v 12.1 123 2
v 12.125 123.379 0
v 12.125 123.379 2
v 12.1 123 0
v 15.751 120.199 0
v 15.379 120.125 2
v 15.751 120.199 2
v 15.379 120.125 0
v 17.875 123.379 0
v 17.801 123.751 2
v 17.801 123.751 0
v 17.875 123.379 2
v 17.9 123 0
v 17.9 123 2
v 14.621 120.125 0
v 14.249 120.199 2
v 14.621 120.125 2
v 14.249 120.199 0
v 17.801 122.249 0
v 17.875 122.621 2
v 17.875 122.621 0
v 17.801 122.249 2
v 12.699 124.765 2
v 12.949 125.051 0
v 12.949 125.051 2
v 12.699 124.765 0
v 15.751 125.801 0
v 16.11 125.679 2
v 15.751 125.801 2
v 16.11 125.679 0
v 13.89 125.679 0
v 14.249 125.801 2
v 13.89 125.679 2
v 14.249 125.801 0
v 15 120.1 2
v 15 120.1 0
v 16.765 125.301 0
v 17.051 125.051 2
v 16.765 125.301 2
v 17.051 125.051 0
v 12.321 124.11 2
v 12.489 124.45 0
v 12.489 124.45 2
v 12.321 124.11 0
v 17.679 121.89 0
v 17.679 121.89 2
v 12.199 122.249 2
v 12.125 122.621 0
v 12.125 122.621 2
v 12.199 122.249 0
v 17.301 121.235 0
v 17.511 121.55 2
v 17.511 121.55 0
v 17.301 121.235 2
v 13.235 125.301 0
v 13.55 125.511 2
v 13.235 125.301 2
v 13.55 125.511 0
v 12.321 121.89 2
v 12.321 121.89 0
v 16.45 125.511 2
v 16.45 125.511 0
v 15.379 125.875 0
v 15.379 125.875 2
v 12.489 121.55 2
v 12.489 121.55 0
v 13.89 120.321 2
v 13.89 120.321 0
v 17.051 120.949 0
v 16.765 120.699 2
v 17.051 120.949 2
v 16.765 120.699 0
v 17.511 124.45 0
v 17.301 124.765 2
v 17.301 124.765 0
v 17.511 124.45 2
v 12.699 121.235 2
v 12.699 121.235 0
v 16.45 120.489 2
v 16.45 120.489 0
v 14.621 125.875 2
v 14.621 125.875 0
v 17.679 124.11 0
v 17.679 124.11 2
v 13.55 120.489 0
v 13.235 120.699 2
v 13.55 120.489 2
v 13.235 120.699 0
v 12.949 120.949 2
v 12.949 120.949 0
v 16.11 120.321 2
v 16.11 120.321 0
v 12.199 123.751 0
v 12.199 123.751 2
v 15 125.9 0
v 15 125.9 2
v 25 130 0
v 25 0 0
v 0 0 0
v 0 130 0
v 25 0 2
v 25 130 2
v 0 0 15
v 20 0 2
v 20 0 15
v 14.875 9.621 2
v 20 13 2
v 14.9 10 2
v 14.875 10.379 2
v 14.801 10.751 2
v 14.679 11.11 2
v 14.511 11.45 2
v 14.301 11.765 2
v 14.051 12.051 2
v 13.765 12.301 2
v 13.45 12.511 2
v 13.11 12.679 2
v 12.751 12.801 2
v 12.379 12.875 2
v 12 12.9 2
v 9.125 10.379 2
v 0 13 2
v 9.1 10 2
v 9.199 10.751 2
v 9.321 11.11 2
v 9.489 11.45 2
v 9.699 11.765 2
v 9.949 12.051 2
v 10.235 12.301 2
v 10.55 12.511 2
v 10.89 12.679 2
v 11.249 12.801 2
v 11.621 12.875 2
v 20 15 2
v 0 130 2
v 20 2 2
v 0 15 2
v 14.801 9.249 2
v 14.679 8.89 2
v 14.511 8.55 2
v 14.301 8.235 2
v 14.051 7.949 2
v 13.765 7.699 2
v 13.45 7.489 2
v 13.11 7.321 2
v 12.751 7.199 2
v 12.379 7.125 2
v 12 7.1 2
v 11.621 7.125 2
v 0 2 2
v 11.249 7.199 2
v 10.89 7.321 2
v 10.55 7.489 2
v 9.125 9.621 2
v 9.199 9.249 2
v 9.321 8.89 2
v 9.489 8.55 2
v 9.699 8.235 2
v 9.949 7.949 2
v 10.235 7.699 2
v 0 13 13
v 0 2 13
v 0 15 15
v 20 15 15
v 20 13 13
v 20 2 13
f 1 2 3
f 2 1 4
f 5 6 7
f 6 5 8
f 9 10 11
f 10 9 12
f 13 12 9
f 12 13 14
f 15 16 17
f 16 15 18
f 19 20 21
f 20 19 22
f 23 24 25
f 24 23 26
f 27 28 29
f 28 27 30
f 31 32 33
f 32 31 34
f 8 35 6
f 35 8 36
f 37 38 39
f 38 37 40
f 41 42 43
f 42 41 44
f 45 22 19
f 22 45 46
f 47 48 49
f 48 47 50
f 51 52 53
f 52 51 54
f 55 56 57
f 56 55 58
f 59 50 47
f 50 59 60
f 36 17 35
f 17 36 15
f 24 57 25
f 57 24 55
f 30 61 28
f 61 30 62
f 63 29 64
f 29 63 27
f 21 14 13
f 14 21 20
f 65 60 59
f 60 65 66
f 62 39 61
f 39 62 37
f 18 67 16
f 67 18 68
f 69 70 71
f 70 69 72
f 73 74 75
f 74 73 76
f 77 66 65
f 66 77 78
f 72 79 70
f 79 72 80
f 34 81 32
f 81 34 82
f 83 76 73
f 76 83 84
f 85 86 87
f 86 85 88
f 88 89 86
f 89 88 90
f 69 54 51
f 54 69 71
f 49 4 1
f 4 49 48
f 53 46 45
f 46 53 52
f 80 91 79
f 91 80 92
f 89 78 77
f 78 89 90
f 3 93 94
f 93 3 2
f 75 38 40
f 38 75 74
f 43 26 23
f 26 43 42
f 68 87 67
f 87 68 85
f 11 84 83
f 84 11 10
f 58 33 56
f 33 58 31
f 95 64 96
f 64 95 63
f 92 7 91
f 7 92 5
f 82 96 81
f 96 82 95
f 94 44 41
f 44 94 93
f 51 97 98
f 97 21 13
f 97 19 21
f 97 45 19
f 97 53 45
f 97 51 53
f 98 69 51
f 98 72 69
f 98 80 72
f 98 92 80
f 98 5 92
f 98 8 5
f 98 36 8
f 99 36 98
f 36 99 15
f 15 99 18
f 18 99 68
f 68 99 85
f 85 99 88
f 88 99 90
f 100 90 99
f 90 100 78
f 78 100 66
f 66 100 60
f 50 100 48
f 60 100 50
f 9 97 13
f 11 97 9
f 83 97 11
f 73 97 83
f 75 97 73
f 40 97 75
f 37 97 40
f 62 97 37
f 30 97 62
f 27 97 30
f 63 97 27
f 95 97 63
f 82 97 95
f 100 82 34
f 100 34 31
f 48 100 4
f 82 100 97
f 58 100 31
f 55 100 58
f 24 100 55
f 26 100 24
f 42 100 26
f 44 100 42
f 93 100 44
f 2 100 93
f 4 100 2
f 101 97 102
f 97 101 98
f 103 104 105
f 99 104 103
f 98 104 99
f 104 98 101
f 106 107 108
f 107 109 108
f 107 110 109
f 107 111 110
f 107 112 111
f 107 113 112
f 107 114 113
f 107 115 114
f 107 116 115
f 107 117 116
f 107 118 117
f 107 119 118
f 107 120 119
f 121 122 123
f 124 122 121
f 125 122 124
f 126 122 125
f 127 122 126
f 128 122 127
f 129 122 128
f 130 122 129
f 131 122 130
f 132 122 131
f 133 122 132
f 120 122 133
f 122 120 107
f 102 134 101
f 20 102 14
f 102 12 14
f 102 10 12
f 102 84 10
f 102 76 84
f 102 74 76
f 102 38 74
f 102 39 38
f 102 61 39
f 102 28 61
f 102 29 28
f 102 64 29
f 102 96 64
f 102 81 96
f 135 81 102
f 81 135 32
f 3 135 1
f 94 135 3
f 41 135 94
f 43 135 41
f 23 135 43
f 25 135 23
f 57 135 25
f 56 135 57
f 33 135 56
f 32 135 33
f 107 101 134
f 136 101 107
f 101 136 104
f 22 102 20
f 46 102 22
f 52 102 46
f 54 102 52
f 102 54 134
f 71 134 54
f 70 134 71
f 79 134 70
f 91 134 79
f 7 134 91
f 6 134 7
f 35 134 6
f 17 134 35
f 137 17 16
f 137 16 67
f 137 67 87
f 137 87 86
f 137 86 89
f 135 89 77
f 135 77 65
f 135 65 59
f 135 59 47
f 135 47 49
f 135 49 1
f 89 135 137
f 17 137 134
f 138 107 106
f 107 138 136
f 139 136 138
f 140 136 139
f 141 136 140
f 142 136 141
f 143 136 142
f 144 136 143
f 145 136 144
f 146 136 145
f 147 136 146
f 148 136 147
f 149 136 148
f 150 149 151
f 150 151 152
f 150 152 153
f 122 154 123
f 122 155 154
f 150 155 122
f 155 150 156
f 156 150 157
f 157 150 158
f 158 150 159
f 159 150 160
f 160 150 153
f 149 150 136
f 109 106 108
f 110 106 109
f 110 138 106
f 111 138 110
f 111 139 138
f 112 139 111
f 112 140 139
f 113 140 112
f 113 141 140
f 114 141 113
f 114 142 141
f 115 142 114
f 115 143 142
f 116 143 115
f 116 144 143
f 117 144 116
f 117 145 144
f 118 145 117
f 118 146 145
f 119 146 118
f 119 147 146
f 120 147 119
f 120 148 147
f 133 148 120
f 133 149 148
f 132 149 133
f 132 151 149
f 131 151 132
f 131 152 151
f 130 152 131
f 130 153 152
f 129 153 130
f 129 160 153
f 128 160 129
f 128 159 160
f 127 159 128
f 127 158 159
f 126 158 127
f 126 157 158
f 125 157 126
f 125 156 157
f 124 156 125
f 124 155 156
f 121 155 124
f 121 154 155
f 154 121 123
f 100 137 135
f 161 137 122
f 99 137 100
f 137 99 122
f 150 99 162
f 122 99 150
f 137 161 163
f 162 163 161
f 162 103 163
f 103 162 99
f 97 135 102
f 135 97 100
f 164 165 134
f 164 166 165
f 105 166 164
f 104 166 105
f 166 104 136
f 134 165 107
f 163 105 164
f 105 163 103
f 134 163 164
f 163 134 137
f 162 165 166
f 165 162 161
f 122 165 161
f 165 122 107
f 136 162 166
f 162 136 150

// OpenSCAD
$fn = 48;

union() {
	difference() {
		linear_extrude(height = 2) {
			polygon(paths = [[0, 1, 2, 3]], points = [[0, 0], [0, 130], [25, 130], [25, 0]]);
		}
		union() {
			translate(v = [12, 10, -1]) {
				cylinder(h = 4, r = 2.9000000000);
			}
			translate(v = [15, 123, -1]) {
				cylinder(h = 4, r = 2.9000000000);
			}
		}
	}
	difference() {
		cube(size = [20, 15, 15]);
		translate(v = [-1, 2, 2]) {
			cube(size = [22, 11, 11]);
		}
	}
}
/***********************************************
*********      SolidPython code:      **********
************************************************
 
#! /usr/bin/env python
# -*- coding: utf-8 -*-
from __future__ import division
import os
import sys

from solid import *
from solid.utils import *

SEGMENTS = 48

def holder():
    return cube(size=[20, 15, 15]) - (translate([-1, 2, 2])(cube(size=[22, 11, 11])))

def stand_base():
    height = 130
    width = 25
    return polygon(points = [[0, 0], [0, height], [width, height], [width, 0]])

def extruded_base():
    shape = stand_base()
    extruded = linear_extrude(height = 2)(shape)
    screw_hole = cylinder(r=2.9, h=4)
    hole_distance = 113
    screw_holes = translate([12,10,-1])(screw_hole) + translate([15,10 + hole_distance, -1])(screw_hole)
    holders = holder()
    return (extruded - screw_holes) + holders

if __name__ == '__main__':
    out_dir = sys.argv[1] if len(sys.argv) > 1 else os.curdir
    file_out = os.path.join(out_dir, 'basic_geometry.scad')

    a = extruded_base()

    print("%(__file__)s: SCAD file written to: \n%(file_out)s" % vars())

    # Adding the file_header argument as shown allows you to change
    # the detail of arcs by changing the SEGMENTS variable.  This can
    # be expensive when making lots of small curves, but is otherwise
    # useful.
    scad_render_to_file(a, file_out, file_header='$fn = %s;' % SEGMENTS) 
 
************************************************/
